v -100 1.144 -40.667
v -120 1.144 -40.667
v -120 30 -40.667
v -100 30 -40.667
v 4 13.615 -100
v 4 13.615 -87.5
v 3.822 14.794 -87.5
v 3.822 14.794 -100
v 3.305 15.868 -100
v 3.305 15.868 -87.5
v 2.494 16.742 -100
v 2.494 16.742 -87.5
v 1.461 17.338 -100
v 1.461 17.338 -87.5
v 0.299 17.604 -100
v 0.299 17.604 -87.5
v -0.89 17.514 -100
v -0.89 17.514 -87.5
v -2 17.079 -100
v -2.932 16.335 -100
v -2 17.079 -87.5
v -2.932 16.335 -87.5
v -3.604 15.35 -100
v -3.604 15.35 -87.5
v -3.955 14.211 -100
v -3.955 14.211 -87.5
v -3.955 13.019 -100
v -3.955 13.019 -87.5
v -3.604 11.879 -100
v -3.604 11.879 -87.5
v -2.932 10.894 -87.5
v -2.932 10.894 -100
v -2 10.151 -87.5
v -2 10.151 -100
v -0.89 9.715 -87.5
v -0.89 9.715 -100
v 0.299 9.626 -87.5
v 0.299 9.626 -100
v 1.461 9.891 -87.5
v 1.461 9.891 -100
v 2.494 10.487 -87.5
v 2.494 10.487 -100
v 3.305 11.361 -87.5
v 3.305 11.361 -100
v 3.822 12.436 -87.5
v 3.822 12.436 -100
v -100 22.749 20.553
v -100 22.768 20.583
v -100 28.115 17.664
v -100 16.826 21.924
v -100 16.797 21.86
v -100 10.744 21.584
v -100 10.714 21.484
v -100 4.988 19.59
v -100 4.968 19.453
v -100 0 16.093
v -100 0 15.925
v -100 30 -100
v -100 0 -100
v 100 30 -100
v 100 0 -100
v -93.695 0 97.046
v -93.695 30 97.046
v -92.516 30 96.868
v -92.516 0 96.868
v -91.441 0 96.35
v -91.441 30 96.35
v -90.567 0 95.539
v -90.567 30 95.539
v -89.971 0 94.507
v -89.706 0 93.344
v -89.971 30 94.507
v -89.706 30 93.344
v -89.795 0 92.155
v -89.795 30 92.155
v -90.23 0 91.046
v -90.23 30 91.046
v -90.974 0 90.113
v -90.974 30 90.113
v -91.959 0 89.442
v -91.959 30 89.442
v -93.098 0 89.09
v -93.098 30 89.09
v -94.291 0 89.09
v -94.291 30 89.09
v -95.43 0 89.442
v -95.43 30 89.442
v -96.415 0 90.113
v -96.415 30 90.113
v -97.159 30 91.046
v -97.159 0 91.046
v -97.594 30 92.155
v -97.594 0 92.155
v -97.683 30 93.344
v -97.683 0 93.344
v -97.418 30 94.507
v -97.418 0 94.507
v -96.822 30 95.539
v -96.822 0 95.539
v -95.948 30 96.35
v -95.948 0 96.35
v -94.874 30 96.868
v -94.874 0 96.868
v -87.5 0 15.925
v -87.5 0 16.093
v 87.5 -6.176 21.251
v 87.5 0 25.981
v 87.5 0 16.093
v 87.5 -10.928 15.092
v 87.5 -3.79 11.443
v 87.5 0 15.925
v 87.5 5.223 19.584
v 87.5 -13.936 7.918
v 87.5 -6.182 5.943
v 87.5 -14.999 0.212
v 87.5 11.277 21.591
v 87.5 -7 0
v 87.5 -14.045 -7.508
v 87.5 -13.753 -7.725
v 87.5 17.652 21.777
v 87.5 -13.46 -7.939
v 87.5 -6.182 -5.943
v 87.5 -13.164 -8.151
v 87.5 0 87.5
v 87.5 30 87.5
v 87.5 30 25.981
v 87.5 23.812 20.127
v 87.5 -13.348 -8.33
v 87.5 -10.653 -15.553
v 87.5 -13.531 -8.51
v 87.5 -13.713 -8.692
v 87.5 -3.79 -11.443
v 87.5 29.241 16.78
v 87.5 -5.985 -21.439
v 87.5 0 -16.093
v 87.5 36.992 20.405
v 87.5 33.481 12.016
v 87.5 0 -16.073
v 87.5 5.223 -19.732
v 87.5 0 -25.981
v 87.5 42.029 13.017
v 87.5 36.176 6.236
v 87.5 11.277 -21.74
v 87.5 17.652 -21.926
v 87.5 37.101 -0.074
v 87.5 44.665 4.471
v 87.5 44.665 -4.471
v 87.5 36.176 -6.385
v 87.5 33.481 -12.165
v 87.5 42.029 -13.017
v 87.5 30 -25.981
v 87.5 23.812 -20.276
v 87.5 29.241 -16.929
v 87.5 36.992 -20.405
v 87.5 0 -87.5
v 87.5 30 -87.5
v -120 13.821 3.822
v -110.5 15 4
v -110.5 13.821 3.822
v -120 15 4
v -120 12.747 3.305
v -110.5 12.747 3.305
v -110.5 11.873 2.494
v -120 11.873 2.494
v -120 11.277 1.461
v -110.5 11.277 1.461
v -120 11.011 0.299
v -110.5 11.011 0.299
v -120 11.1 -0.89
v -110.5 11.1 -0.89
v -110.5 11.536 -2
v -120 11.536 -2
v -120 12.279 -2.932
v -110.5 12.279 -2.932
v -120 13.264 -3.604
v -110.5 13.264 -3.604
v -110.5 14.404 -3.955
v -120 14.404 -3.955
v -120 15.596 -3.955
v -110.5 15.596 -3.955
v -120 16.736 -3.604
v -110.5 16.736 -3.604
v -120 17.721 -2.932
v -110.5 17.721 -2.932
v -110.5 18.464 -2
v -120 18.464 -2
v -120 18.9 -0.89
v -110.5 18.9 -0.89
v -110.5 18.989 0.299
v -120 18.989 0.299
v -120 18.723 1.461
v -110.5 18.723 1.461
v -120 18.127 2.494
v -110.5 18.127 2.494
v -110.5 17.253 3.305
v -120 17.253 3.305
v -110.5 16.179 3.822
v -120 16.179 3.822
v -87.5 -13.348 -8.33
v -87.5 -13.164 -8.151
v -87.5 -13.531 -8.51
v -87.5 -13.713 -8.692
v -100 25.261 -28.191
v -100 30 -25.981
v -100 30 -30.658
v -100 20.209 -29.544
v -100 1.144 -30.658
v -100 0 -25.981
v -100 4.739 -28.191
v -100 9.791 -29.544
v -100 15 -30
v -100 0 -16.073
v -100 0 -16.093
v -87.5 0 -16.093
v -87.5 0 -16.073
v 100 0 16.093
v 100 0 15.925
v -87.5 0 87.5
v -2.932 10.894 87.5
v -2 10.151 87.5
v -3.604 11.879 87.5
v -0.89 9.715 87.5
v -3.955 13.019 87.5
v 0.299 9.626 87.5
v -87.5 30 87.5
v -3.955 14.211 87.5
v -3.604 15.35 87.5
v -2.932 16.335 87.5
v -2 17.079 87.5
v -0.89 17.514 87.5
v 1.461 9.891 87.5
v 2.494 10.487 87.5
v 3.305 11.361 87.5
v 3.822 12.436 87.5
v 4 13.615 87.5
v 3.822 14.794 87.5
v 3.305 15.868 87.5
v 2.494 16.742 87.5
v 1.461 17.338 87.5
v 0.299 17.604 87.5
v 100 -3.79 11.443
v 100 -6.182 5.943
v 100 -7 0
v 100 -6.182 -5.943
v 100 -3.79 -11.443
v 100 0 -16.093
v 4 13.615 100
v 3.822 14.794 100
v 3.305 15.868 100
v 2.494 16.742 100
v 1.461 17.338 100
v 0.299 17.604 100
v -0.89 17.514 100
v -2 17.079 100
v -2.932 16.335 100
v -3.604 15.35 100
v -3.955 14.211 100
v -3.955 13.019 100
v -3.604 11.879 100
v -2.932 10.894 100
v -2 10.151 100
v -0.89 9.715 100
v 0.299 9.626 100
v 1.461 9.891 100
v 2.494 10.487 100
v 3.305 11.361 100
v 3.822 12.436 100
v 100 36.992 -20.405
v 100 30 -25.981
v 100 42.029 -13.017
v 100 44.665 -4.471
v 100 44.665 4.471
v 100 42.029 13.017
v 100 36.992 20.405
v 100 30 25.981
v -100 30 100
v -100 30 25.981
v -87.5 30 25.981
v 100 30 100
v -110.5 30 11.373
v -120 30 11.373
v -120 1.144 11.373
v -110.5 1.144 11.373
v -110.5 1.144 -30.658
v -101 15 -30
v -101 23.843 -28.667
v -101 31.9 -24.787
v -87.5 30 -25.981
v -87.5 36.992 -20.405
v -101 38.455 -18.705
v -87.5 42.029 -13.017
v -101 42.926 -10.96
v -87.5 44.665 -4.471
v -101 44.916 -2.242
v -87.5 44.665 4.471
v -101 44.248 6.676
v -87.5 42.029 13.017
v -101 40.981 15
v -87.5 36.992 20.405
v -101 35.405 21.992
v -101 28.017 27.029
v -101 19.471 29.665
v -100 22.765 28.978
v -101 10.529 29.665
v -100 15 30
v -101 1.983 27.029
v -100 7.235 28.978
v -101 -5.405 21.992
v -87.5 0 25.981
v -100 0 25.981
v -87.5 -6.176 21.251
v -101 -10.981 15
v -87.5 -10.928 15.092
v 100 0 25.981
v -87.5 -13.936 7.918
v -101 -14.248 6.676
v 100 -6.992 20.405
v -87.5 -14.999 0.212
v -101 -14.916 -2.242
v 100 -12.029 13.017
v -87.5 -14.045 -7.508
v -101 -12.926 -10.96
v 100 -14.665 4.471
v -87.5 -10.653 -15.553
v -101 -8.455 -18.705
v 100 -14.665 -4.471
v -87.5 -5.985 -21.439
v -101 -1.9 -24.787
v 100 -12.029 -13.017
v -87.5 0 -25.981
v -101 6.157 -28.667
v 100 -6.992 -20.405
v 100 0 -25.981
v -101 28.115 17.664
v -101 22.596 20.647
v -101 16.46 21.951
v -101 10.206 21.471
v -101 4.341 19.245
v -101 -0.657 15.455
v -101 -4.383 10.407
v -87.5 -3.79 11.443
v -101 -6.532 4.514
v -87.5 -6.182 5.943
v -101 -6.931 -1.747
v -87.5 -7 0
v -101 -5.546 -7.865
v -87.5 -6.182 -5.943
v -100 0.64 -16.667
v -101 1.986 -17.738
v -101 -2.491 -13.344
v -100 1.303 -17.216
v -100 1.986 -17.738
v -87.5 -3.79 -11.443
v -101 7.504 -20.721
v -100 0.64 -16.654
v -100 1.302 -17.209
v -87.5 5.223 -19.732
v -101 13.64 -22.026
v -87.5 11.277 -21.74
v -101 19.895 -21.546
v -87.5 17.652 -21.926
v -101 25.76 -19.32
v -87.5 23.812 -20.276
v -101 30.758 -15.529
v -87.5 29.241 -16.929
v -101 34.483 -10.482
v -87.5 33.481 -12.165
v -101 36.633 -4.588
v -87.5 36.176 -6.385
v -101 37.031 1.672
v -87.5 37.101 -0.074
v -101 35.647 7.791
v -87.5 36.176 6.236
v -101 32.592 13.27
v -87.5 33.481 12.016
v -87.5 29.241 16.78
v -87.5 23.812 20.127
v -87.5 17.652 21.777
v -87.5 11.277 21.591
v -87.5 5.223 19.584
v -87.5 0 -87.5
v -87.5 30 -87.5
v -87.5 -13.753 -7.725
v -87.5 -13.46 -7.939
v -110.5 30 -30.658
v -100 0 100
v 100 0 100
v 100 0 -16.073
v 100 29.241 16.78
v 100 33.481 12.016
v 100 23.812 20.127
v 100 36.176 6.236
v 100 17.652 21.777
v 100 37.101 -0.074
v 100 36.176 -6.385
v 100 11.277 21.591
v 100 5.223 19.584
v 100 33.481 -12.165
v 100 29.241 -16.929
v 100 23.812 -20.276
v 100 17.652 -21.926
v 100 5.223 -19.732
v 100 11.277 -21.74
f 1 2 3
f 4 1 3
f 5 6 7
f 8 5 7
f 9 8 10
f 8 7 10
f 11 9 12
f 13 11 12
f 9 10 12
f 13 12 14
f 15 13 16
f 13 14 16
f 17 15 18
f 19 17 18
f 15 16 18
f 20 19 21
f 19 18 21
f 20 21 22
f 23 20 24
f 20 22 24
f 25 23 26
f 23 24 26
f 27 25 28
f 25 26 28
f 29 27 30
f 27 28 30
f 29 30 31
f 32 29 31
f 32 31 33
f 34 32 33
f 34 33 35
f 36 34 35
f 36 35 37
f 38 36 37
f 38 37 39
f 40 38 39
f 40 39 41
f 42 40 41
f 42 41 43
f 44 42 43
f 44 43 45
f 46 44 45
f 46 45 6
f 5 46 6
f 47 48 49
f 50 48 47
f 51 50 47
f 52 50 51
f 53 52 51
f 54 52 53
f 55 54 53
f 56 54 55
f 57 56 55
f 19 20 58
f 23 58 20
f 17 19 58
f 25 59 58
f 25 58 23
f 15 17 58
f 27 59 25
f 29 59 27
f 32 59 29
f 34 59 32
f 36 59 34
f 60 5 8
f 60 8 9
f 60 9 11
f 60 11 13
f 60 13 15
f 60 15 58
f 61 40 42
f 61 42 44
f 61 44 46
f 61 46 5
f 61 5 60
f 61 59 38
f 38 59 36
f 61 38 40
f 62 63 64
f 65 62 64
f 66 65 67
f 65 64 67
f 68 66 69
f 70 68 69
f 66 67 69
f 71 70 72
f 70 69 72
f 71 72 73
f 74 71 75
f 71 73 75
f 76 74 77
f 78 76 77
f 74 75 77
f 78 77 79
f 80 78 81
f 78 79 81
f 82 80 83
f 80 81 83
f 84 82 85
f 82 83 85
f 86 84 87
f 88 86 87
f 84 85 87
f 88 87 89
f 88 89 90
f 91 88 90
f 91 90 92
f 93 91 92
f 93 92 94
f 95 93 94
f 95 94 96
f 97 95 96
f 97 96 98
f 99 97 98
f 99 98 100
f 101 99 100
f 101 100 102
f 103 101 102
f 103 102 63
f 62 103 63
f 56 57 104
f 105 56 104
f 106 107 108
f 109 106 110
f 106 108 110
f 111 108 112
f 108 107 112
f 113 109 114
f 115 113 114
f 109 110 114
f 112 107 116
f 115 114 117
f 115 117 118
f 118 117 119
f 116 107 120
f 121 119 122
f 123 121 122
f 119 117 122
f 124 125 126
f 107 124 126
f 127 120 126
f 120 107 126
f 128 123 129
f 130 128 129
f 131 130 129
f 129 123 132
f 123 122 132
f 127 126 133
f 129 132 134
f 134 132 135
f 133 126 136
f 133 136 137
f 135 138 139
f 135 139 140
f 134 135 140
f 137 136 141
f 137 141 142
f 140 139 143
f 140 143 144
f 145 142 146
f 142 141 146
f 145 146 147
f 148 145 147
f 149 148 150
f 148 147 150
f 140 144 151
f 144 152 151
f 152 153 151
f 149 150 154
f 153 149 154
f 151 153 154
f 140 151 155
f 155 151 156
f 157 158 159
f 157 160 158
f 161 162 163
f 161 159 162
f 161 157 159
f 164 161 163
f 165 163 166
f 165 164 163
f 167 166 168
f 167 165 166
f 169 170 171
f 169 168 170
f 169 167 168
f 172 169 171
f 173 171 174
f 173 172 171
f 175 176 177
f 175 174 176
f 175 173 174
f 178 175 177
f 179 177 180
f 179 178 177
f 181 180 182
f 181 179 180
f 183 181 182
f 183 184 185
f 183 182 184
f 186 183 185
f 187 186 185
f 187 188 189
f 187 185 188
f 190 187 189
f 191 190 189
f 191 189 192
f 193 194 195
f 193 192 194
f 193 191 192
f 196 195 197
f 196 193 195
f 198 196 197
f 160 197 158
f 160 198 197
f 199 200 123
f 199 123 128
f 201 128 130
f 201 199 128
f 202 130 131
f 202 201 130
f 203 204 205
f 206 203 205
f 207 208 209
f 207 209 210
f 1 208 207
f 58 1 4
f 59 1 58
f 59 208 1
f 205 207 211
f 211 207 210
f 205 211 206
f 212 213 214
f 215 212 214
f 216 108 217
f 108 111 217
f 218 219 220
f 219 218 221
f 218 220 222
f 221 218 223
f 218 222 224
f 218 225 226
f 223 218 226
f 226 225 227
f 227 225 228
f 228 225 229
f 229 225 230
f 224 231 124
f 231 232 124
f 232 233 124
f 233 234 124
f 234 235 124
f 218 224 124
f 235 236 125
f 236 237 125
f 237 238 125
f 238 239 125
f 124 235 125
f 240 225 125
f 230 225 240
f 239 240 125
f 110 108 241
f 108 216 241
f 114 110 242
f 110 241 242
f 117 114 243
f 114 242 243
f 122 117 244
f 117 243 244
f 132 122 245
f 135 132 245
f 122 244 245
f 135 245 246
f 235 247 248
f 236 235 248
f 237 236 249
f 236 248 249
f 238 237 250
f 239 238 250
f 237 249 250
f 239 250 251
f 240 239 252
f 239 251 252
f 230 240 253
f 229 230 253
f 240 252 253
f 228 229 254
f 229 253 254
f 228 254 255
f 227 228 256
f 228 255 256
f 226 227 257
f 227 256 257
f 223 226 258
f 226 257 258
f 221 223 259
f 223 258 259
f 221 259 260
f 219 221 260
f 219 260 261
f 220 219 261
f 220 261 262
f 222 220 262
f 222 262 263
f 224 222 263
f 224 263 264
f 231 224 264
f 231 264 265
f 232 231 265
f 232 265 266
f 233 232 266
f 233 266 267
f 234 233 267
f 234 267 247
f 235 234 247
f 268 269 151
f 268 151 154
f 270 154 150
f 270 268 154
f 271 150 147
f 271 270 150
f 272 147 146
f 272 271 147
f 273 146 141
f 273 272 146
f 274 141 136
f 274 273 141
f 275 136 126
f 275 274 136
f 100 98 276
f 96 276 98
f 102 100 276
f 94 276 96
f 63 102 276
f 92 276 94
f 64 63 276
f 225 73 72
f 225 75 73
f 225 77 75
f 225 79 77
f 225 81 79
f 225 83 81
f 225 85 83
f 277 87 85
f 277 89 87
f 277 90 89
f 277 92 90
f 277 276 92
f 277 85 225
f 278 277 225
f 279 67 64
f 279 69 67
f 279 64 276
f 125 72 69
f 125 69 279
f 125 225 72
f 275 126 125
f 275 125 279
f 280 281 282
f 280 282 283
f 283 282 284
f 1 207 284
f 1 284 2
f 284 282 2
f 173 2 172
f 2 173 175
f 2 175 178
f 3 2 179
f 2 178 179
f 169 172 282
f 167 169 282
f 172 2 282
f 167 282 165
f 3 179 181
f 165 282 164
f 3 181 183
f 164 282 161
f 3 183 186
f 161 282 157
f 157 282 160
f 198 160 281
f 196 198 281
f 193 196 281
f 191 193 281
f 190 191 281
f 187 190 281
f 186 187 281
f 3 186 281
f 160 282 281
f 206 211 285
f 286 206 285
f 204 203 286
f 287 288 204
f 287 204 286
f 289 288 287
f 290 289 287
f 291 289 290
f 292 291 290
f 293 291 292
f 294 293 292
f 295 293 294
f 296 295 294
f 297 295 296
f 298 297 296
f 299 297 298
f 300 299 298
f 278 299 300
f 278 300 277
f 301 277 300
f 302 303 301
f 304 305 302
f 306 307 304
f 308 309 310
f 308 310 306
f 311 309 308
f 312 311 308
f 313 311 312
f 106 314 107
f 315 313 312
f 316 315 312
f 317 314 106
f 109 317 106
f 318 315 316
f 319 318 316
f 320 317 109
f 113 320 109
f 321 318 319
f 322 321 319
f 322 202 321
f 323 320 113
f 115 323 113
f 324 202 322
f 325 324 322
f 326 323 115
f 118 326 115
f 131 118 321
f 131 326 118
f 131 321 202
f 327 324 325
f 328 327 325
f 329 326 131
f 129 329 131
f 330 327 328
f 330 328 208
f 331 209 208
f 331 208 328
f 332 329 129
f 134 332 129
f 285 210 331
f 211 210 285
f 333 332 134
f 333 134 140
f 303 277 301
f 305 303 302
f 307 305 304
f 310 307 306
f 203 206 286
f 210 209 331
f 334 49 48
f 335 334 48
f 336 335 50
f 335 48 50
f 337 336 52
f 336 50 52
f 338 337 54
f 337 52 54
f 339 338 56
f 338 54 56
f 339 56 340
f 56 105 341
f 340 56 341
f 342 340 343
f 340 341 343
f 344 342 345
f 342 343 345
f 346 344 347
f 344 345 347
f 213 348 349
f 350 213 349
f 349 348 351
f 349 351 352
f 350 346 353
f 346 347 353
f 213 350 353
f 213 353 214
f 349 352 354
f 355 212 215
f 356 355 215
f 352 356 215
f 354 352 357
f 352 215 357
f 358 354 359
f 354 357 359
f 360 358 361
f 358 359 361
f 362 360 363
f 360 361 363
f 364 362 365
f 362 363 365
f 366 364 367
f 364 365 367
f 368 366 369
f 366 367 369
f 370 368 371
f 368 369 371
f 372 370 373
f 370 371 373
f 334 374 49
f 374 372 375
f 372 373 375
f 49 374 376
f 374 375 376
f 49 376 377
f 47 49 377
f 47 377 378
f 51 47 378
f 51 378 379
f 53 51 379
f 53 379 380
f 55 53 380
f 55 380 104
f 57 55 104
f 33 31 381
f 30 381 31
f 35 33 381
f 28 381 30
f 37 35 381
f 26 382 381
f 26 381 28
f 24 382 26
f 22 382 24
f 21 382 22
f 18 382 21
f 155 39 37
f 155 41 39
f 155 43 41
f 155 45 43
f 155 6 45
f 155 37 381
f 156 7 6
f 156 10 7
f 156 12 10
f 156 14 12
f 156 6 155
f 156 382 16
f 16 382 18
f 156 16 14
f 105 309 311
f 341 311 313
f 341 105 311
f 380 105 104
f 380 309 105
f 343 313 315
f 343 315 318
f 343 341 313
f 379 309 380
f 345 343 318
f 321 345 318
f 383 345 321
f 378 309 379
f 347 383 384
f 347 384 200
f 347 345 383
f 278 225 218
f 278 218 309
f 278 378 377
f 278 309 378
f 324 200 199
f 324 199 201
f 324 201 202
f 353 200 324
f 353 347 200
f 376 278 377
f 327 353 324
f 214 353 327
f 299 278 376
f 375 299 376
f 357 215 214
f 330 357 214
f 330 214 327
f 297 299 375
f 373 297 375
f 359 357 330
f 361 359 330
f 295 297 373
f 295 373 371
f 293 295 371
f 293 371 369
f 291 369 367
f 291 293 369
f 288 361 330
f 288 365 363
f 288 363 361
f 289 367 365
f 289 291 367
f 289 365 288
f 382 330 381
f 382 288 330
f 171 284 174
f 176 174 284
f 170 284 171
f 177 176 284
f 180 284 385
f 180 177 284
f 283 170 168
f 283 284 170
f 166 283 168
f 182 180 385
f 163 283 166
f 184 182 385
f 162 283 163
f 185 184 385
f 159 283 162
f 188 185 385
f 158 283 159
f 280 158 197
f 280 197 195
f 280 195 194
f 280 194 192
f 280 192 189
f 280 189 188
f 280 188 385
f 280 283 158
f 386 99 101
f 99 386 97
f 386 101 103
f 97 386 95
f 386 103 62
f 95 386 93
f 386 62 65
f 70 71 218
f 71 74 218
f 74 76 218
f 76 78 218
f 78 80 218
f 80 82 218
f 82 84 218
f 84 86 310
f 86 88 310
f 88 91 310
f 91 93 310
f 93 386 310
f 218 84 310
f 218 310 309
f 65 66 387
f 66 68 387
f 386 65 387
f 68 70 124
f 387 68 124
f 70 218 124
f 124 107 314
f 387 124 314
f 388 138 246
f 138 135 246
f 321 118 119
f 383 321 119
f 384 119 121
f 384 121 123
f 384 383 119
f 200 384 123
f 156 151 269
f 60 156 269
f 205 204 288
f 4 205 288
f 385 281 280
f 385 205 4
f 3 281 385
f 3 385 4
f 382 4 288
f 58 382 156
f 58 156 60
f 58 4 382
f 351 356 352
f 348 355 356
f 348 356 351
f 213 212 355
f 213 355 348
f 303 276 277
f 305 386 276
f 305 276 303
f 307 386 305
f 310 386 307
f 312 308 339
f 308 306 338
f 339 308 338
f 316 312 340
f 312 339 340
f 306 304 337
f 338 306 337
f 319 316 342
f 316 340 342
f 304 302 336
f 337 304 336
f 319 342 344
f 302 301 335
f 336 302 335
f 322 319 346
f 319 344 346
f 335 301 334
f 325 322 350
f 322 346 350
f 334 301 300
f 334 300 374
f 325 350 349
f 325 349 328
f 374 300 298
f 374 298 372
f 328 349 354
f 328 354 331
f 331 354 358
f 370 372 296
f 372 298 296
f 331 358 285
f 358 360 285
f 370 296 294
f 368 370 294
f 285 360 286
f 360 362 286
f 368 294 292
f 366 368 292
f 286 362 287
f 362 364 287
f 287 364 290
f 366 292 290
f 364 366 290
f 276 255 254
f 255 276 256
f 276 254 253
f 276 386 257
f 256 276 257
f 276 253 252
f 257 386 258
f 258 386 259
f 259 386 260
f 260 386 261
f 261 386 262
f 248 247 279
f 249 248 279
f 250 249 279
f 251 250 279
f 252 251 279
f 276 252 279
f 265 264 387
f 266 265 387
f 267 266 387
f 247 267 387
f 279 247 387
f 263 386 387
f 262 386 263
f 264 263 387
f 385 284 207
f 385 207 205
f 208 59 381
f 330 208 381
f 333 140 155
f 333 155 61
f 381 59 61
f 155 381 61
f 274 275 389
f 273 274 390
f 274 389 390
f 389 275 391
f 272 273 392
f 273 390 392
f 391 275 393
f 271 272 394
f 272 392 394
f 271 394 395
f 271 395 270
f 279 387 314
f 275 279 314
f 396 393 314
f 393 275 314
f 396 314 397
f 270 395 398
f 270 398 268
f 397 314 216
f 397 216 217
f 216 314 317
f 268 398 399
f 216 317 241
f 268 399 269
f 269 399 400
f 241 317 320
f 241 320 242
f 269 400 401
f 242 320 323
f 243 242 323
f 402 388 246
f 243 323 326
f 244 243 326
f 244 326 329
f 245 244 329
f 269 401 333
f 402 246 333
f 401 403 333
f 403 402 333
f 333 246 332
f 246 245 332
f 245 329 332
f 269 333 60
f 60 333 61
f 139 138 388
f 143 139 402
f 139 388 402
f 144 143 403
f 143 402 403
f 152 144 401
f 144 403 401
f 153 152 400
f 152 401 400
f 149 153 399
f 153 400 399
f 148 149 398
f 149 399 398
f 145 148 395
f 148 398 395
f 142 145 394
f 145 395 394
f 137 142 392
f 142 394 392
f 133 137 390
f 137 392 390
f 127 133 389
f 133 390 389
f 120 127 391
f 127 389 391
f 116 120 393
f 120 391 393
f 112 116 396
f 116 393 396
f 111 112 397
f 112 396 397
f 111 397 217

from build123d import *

# Parameters (mm, degrees)
SKETCH1_W           = 200
SKETCH1_H           = 200
BOSS_EXTRUDE1_DEPTH = 30
SKETCH4_W           = 175
SKETCH4_H           = 175
CUT_EXTRUDE1_DEPTH  = 30
SKETCH7_R           = 4
CUT_EXTRUDE2_DEPTH  = 210
SKETCH10_W          = 6.040230253
SKETCH10_H          = 30
BOSS_EXTRUDE2_DEPTH = 20
SKETCH11_W          = 10
SKETCH11_H          = 30
BOSS_EXTRUDE3_DEPTH = 20
CUT_EXTRUDE3_START  = -231
SKETCH12_R          = 4
CUT_EXTRUDE3_DEPTH  = 231
SKETCH13_R          = 4
CUT_EXTRUDE5_DEPTH  = 231
SKETCH14_R          = 4
CUT_EXTRUDE6_DEPTH  = 250.5
SKETCH15_R          = 30
SKETCH15_R_2        = 22
BOSS_EXTRUDE5_DEPTH = 201
SKETCH17_R          = 22
CUT_EXTRUDE7_DEPTH  = 201
SKETCH21_W          = 9.5
SKETCH21_H          = 28.855904386
BOSS_EXTRUDE6_DEPTH = 26
SKETCH22_W          = 9.5
SKETCH22_H          = 6.040230253
CUT_EXTRUDE10_DEPTH = 49
SKETCH23_W          = 10.008922512
SKETCH23_H          = 28.855904386
BOSS_EXTRUDE7_DEPTH = 21
SKETCH24_W          = 9.5
SKETCH24_H          = 1.144095614
CUT_EXTRUDE11_DEPTH = 27
SKETCH26_W          = 0.50137975
SKETCH26_H          = 20.893624798
CUT_EXTRUDE12_DEPTH = 35
SKETCH27_R          = 49.192783102
CUT_EXTRUDE13_DEPTH = 175
SKETCH28_R          = 41.209023923
CUT_EXTRUDE14_DEPTH = 175


with BuildPart() as part:
    # Sketch1 → Boss-Extrude1 (new body)
    with BuildSketch(Plane(origin=(0, 0, 0), x_dir=(1, 0, 0), z_dir=(0, 1, 0))):
        Rectangle(SKETCH1_W, SKETCH1_H)
    extrude(amount=BOSS_EXTRUDE1_DEPTH)

    # Sketch4 → Cut-Extrude1 (cut)
    with BuildSketch(Plane(origin=(0, 30, 0), x_dir=(1, 0, 0), z_dir=(0, 1, 0))):
        Rectangle(SKETCH4_W, SKETCH4_H)
    extrude(amount=-CUT_EXTRUDE1_DEPTH, mode=Mode.SUBTRACT)

    # Sketch7 → Cut-Extrude2 (cut)
    with BuildSketch(Plane.ZY.offset(100)):
        with Locations((0, 15)):
            Circle(SKETCH7_R)
    extrude(amount=-CUT_EXTRUDE2_DEPTH, mode=Mode.SUBTRACT)

    # Sketch10 → Boss-Extrude2 (add)
    with BuildSketch(Plane.ZY.offset(100)):
        with Locations((-11.64671233, 15)):
            Rectangle(SKETCH10_W, SKETCH10_H)
    extrude(amount=BOSS_EXTRUDE2_DEPTH)

    # Sketch11 → Boss-Extrude3 (add)
    with BuildSketch(Plane.XY.offset(-8.626597203)):
        with Locations((-115, 15)):
            Rectangle(SKETCH11_W, SKETCH11_H)
    extrude(amount=BOSS_EXTRUDE3_DEPTH)

    # Sketch12 → Cut-Extrude3 (cut)
    with BuildSketch(Plane(origin=(100, 0, 0), x_dir=(0, 0, -1), z_dir=(1, 0, 0)).offset(CUT_EXTRUDE3_START)):
        with Locations(Location((0, 15, 0), (0, 0, 180))):
            Circle(SKETCH12_R)
    extrude(amount=CUT_EXTRUDE3_DEPTH, mode=Mode.SUBTRACT)

    # Sketch13 → Cut-Extrude5 (cut)
    with BuildSketch(Plane(origin=(0, 30, 0), x_dir=(1, 0, 0), z_dir=(0, 1, 0))):
        with Locations(Location((-93.69452155, -93.045501349, 0), (0, 0, 270))):
            Circle(SKETCH13_R)
    extrude(amount=-CUT_EXTRUDE5_DEPTH, mode=Mode.SUBTRACT)

    # Sketch14 → Cut-Extrude6 (cut)
    with BuildSketch(Plane.XY.offset(100)):
        with Locations((0, 13.614739596)):
            Circle(SKETCH14_R)
    extrude(amount=-CUT_EXTRUDE6_DEPTH, mode=Mode.SUBTRACT)

    # Sketch15 → Boss-Extrude5 (add)
    with BuildSketch(Plane(origin=(100, 0, 0), x_dir=(0, 0, -1), z_dir=(1, 0, 0))):
        with Locations((0, 15)):
            Circle(SKETCH15_R)
        with Locations((0, 15)):
            Circle(SKETCH15_R_2, mode=Mode.SUBTRACT)
    extrude(amount=-BOSS_EXTRUDE5_DEPTH)

    # Sketch17 → Cut-Extrude7 (cut)
    with BuildSketch(Plane(origin=(100, 0, 0), x_dir=(0, 0, -1), z_dir=(1, 0, 0))):
        with Locations((0.074377339, 15.100772812)):
            Circle(SKETCH17_R)
    extrude(amount=-CUT_EXTRUDE7_DEPTH, mode=Mode.SUBTRACT)


with BuildPart() as cut_extrude7_piece_1:
    # of the separate pieces the step leaves, piece 1, a body of its own (cut_extrude7_pieces)
    add(part.part.solids().sort_by_distance((-100, 0, -100))[0])



with BuildPart() as cut_extrude7_piece_2:
    # of the separate pieces the step leaves, piece 2, a body of its own (cut_extrude7_pieces)
    add(part.part.solids().sort_by_distance((-101, 0, -14.666827456))[0])

    # Sketch21 → Boss-Extrude6 (add)
    with BuildSketch(Plane(origin=(0, 0, -14.666827456), x_dir=(-1, 0, 0), z_dir=(0, 0, -1))):
        with Locations((115.25, 15.572047807)):
            Rectangle(SKETCH21_W, SKETCH21_H)
    extrude(amount=BOSS_EXTRUDE6_DEPTH)

    # Sketch22 → Cut-Extrude10 (cut)
    with BuildSketch(Plane(origin=(0, 30, 0), x_dir=(1, 0, 0), z_dir=(0, 1, 0))):
        with Locations((-105.75, 11.64671233)):
            Rectangle(SKETCH22_W, SKETCH22_H)
    extrude(amount=-CUT_EXTRUDE10_DEPTH, mode=Mode.SUBTRACT)


with BuildPart() as cut_extrude7_piece_1_1:
    add(cut_extrude7_piece_1.part)

    add(cut_extrude7_piece_2.part)  # Boss-Extrude7 merges Cut-Extrude7 piece 2
    # Sketch23 → Boss-Extrude7 (add)
    with BuildSketch(Plane(origin=(-110.5, 0, 0), x_dir=(0, 0, -1), z_dir=(1, 0, 0))):
        with Locations((35.6623662, 15.572047807)):
            Rectangle(SKETCH23_W, SKETCH23_H)
    extrude(amount=BOSS_EXTRUDE7_DEPTH)

    # Sketch24 → Cut-Extrude11 (cut)
    with BuildSketch(Plane(origin=(0, 0, -14.666827456), x_dir=(-1, 0, 0), z_dir=(0, 0, -1))):
        with Locations((115.25, 0.572047807)):
            Rectangle(SKETCH24_W, SKETCH24_H)
    extrude(amount=-CUT_EXTRUDE11_DEPTH, mode=Mode.SUBTRACT)

    # Sketch26 → Cut-Extrude12 (cut)
    with BuildSketch(Plane.XZ):
        with Locations((-110.249310125, 1.820215196)):
            Rectangle(SKETCH26_W, SKETCH26_H)
    extrude(amount=-CUT_EXTRUDE12_DEPTH, mode=Mode.SUBTRACT)

    # Sketch27 → Cut-Extrude13 (cut)
    with BuildSketch(Plane(origin=(-87.5, 0, 0), x_dir=(0, 0, -1), z_dir=(1, 0, 0))):
        with Locations((-31.916352411, 15.376133278)):
            Circle(SKETCH27_R)
    extrude(amount=CUT_EXTRUDE13_DEPTH, mode=Mode.SUBTRACT)

    # Sketch28 → Cut-Extrude14 (cut)
    with BuildSketch(Plane(origin=(-87.5, 0, 0), x_dir=(0, 0, -1), z_dir=(1, 0, 0))):
        with Locations((37.762434774, 15.494435184)):
            Circle(SKETCH28_R)
    extrude(amount=CUT_EXTRUDE14_DEPTH, mode=Mode.SUBTRACT)


solid = cut_extrude7_piece_1_1.part
